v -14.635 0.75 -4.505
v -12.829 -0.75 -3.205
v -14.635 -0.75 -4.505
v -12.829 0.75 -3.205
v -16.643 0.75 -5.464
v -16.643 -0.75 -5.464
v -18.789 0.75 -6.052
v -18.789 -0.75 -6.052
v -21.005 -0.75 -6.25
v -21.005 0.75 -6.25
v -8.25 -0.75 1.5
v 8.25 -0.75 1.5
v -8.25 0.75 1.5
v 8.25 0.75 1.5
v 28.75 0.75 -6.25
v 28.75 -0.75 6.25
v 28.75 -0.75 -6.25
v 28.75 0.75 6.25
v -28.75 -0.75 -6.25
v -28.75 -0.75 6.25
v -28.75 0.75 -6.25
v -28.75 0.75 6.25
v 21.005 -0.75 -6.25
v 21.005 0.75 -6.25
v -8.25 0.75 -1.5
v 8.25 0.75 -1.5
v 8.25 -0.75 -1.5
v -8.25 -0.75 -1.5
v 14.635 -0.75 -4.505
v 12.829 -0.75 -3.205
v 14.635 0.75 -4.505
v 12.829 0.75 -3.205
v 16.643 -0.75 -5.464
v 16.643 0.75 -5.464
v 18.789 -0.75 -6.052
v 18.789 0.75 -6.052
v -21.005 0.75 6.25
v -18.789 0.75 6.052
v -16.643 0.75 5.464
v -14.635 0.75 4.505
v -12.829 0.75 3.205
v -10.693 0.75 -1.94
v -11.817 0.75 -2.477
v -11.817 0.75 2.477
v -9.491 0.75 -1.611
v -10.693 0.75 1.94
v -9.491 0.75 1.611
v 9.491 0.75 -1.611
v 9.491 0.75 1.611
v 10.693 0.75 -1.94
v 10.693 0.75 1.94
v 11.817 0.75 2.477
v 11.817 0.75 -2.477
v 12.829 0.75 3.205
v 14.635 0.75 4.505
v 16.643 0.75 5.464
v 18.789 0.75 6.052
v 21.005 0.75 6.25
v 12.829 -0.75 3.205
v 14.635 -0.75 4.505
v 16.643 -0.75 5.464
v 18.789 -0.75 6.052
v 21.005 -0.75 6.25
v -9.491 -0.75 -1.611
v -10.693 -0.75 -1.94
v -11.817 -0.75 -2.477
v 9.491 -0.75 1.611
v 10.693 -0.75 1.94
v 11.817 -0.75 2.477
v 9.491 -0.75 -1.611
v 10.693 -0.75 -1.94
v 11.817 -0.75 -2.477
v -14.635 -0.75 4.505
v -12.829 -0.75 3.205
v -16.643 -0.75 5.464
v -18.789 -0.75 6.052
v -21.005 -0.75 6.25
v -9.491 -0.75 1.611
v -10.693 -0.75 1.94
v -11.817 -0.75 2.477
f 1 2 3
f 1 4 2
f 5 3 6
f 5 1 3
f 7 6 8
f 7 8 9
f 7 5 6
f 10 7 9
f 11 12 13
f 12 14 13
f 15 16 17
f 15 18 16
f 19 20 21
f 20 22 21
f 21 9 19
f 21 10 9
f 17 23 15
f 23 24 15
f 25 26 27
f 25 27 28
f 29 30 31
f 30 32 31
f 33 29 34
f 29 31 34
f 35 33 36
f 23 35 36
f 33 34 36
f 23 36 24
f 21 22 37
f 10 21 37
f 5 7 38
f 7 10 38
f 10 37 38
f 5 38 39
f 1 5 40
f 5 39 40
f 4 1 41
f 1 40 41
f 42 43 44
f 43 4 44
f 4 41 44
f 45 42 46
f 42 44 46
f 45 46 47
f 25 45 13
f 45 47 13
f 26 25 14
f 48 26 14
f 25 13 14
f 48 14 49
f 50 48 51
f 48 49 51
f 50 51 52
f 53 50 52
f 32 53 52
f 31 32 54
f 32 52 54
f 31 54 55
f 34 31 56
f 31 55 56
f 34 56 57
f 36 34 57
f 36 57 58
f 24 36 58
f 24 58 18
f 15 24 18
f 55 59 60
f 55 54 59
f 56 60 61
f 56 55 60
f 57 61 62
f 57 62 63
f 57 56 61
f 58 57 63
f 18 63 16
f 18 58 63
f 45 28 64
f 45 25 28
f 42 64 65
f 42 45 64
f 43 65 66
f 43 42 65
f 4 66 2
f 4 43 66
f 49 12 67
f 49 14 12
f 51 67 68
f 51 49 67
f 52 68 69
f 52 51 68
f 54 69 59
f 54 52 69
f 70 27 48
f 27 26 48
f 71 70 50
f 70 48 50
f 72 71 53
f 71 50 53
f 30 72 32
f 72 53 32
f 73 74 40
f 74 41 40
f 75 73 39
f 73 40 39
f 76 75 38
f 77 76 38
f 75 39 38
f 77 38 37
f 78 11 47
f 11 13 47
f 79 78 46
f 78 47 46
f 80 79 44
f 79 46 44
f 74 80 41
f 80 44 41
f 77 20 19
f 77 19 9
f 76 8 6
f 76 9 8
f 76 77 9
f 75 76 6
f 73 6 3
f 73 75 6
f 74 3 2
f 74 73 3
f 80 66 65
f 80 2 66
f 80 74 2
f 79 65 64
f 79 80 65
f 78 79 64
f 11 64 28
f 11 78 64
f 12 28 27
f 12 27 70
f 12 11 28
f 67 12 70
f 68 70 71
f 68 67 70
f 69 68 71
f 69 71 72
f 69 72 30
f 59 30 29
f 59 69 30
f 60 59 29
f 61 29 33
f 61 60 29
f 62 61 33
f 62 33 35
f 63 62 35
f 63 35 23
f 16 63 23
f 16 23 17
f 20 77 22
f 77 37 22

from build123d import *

# Parameters (mm, degrees)
BOSS_EXTRUDE1_DEPTH                      = 1.5
MIRROR1_AT_THE_SECOND_PLANE_COPY_1_DEPTH = 1.5
SCALE1_SCALE                             = 0.5


with BuildPart() as part:
    # Sketch1 → Boss-Extrude1 (new, symmetric)
    with BuildSketch(Plane(origin=(0, 0, 0), x_dir=(1, 0, 0), z_dir=(0, 1, 0))):
        with BuildLine():
            Line((0, 3), (16.5, 3))
            ThreePointArc((16.5, 3), (21.385877083, 3.880236087), (25.657364834, 6.41025641))
            ThreePointArc((25.657364834, 6.41025641), (33.285021532, 10.928149844), (42.009802038, 12.5))
            Line((42.009802038, 12.5), (57.5, 12.5))
            Line((57.5, 12.5), (57.5, 0))
            Line((57.5, 0), (0, 0))
            Line((0, 0), (0, 3))
        make_face()
    boss_extrude1 = extrude(amount=BOSS_EXTRUDE1_DEPTH, both=True)



with BuildPart() as mirror1_1:
    # Mirror1: Boss-Extrude1 across plane
    add(boss_extrude1.mirror(Plane(origin=(0, 0, 0), x_dir=(0, 0, 1), z_dir=(1, 0, 0))))


with BuildPart() as part_1:
    add(part.part)

    add(mirror1_1.part)  # Mirror1 at the second plane merges Mirror1_1
    # Mirror1 at the second plane: Boss-Extrude1 across plane
    add(boss_extrude1.mirror(Plane.XY))

    # Mirror1 at the second plane copy 1 sketc → Mirror1 at the second plane copy 1 (add, symmetric)
    with BuildSketch(Plane(origin=(0, 0, 0), x_dir=(-1, 0, 0), z_dir=(0, 1, 0))):
        with BuildLine():
            Line((0, 3), (16.5, 3))
            ThreePointArc((16.5, 3), (21.385877083, 3.880236087), (25.657364834, 6.41025641))
            ThreePointArc((25.657364834, 6.41025641), (33.285021532, 10.928149844), (42.009802038, 12.5))
            Line((42.009802038, 12.5), (57.5, 12.5))
            Line((57.5, 12.5), (57.5, 0))
            Line((57.5, 0), (0, 0))
            Line((0, 0), (0, 3))
        make_face()
    extrude(amount=MIRROR1_AT_THE_SECOND_PLANE_COPY_1_DEPTH, both=True)


with BuildPart() as part_2:
    # Scale1: scaled about (0, 0, 0)
    add(part_1.part.scale(SCALE1_SCALE))


solid = part_2.part
